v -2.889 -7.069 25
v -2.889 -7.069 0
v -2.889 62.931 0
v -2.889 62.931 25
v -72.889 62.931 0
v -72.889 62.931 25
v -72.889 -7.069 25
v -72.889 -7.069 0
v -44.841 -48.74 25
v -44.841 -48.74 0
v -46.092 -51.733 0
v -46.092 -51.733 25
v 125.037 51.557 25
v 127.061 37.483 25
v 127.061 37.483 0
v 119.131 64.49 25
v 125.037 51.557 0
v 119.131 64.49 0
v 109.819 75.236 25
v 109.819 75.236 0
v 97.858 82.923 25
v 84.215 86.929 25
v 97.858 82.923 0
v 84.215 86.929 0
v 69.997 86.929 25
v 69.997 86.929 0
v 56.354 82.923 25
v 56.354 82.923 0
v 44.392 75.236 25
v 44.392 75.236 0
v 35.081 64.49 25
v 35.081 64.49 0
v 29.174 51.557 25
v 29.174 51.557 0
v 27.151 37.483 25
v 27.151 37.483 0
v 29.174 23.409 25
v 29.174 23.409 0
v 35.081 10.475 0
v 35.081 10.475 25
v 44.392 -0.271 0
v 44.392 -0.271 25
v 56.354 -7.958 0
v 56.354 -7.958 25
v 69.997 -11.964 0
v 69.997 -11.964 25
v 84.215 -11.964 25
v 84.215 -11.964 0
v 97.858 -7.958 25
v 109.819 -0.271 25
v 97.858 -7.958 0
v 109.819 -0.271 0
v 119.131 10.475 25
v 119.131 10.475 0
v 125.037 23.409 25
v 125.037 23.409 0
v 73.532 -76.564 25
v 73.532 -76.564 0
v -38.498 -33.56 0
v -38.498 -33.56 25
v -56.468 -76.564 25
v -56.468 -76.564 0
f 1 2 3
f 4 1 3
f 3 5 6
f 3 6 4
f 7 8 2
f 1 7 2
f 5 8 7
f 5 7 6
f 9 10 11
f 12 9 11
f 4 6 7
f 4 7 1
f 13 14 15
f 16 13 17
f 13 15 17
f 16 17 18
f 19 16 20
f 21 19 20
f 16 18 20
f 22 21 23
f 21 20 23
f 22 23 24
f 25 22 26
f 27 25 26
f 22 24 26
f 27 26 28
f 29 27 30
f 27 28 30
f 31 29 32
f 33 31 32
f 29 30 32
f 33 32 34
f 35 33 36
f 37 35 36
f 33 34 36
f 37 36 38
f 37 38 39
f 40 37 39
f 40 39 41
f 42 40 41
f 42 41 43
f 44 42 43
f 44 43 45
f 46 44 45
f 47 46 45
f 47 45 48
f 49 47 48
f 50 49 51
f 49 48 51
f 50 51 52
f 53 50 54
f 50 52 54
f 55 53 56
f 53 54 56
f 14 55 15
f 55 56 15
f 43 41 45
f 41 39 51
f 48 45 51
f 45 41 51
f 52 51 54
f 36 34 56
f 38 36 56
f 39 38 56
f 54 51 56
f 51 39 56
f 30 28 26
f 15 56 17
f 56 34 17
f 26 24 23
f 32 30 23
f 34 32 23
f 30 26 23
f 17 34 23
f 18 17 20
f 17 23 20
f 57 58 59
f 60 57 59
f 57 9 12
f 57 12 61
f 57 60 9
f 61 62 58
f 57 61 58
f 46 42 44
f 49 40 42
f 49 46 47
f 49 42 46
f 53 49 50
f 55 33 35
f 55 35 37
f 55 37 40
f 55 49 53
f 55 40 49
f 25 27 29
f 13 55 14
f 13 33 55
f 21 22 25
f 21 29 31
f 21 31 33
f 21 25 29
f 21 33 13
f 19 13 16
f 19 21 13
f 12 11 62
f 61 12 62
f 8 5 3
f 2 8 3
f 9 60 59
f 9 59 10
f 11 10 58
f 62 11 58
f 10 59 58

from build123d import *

# Parameters (mm, degrees)
F0_W     = 70
F0_H     = 70
F0_R     = 34.7176544055
F1_DEPTH = 25
F0_R_2   = 49.9549817162


with BuildPart() as f1:
    # F0 (on Top) → F1 (new body)
    with BuildSketch(Plane.XY):
        with Locations((-37.8889573056, 27.9310488008)):
            Rectangle(F0_W, F0_H)
        with Locations((-37.8889573056, 27.9310488008)):
            Circle(F0_R, mode=Mode.SUBTRACT)
        with Locations((-37.8889573056, 27.9310488008)):
            Circle(F0_R)
    extrude(amount=F1_DEPTH)


with BuildPart() as f1b:
    # F0 (on Top) → F1, piece 2 (new body)
    with BuildSketch(Plane.XY):
        with Locations((77.1059280634, 37.4826608133)):
            Circle(F0_R_2)
        with Locations((77.1059280634, 37.4826608133)):
            Rectangle(F0_W, F0_H, mode=Mode.SUBTRACT)
        with Locations((77.1059280634, 37.4826608133)):
            Rectangle(F0_W, F0_H)
    extrude(amount=F1_DEPTH)


with BuildPart() as f1c:
    # F0 (on Top) → F1, piece 3 (new body)
    with BuildSketch(Plane.XY):
        with BuildLine():
            Line((-44.8413871581, -48.7397375997), (-46.0921244025, -51.7328290274))
            ThreePointArc((-46.0921244025, -51.7328290274), (-31.2286122772, -75.7585200136), (-9.7718253953, -57.3801600005))
            ThreePointArc((-9.7718253953, -57.3801600005), (-23.9216138018, -39.3210136925), (-44.8413871581, -48.7397375997))
        make_face()
        with BuildLine():
            Line((-46.0921244025, -51.7328290274), (-56.4683983001, -76.5638929389))
            Line((-56.4683983001, -76.5638929389), (73.5316016999, -76.5638929389))
            Line((73.5316016999, -76.5638929389), (-38.4980494797, -33.5597389934))
            Line((-38.4980494797, -33.5597389934), (-44.8413871581, -48.7397375997))
            ThreePointArc((-44.8413871581, -48.7397375997), (-23.9216138018, -39.3210136925), (-9.7718253953, -57.3801600005))
            ThreePointArc((-9.7718253953, -57.3801600005), (-31.2286122772, -75.7585200136), (-46.0921244025, -51.7328290274))
        make_face()
    extrude(amount=F1_DEPTH)


solid = Compound([f1.part, f1b.part, f1c.part])
